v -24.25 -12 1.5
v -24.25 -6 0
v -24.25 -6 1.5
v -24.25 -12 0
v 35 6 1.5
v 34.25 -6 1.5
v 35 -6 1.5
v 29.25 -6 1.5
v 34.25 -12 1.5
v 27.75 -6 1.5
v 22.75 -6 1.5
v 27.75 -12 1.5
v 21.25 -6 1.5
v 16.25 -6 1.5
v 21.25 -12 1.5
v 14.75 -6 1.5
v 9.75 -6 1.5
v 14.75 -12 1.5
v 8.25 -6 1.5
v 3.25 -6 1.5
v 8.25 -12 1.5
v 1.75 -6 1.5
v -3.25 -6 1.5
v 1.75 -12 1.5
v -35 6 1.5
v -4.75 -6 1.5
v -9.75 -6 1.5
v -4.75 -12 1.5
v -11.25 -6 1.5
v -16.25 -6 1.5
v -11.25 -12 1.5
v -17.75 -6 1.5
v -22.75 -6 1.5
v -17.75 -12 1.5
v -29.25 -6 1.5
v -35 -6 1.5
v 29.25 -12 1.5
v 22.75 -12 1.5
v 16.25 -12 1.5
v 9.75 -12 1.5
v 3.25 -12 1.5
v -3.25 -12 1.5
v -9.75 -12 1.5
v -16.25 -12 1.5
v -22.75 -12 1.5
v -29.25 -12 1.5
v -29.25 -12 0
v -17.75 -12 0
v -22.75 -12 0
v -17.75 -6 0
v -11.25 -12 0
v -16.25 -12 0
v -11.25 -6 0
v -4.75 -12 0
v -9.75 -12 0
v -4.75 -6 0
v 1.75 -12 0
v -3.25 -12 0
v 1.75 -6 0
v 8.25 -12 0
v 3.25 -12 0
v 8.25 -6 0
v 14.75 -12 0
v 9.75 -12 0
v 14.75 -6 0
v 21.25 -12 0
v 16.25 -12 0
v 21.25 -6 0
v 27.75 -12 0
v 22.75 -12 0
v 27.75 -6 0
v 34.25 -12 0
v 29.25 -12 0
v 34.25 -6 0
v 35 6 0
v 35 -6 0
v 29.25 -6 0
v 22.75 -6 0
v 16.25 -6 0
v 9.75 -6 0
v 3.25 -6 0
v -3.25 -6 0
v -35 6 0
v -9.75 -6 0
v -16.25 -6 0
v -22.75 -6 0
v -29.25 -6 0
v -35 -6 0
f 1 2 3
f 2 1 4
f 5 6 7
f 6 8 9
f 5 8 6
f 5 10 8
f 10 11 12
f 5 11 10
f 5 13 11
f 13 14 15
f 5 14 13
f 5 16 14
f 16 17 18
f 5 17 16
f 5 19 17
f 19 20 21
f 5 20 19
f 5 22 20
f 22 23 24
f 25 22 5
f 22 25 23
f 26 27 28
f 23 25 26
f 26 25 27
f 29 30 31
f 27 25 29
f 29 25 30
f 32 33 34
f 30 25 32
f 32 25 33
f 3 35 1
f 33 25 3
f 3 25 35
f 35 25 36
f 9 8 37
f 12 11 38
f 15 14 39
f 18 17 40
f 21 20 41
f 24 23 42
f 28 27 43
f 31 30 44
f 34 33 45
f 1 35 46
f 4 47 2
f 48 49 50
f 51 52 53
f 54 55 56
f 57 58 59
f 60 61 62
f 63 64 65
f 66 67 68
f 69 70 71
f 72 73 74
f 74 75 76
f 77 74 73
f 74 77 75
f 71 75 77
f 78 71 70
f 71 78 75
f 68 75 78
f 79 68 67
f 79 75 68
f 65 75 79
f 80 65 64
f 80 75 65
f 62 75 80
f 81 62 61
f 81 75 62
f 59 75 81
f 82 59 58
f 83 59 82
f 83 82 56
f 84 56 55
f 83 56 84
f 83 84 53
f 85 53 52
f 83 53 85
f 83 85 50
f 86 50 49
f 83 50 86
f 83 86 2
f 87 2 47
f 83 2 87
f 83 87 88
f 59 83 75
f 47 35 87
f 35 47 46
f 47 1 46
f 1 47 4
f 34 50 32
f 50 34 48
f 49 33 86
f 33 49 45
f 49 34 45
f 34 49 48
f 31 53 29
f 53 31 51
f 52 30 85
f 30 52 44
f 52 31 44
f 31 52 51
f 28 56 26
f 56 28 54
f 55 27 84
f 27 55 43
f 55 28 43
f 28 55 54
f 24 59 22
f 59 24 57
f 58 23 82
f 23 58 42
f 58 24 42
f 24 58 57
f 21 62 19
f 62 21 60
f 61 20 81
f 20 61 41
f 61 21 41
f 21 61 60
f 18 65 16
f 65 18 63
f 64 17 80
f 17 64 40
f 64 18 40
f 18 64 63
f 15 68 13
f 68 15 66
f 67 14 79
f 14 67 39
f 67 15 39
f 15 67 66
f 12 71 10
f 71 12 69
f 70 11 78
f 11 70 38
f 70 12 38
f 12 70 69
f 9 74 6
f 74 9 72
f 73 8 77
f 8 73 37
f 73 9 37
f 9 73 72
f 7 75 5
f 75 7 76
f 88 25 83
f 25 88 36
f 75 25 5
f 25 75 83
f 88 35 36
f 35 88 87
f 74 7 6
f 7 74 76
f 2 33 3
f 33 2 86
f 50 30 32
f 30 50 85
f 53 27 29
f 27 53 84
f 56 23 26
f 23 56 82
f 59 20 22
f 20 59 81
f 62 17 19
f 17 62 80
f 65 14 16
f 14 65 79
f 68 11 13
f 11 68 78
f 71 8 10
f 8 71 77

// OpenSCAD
// 10-well comb for agarose gel casting
// Print orientation: flat on bed, teeth pointing down (-Y)

// ---- Dimensions (mm) ----
plate_t      = 1.5;   // plate thickness (Z)
spine_l      = 70;    // spine length (X)
spine_w      = 12;    // spine width (Y)
tooth_w      = 5.0;   // tooth width (X)
tooth_l      = 12;    // tooth length (Y)
tooth_count  = 10;    // number of teeth
gap          = 1.5;   // gap between teeth (X)
embed        = 0.5;   // tooth overlap into spine for a clean union

$fn = 64;

// ---- Derived ----
pitch   = tooth_w + gap;                 // centre-to-centre spacing
x_start = -(tooth_count - 1) * pitch / 2; // first tooth centre (row centred)

// ---- Model ----
union() {
    // Spine (back bar)
    translate([-spine_l / 2, -spine_w / 2, 0])
        cube([spine_l, spine_w, plate_t]);

    // Teeth hanging in -Y
    for (i = [0 : tooth_count - 1])
        translate([x_start + i * pitch, -tooth_l, 0])
            cube([tooth_w, tooth_l + embed, plate_t]);
}
